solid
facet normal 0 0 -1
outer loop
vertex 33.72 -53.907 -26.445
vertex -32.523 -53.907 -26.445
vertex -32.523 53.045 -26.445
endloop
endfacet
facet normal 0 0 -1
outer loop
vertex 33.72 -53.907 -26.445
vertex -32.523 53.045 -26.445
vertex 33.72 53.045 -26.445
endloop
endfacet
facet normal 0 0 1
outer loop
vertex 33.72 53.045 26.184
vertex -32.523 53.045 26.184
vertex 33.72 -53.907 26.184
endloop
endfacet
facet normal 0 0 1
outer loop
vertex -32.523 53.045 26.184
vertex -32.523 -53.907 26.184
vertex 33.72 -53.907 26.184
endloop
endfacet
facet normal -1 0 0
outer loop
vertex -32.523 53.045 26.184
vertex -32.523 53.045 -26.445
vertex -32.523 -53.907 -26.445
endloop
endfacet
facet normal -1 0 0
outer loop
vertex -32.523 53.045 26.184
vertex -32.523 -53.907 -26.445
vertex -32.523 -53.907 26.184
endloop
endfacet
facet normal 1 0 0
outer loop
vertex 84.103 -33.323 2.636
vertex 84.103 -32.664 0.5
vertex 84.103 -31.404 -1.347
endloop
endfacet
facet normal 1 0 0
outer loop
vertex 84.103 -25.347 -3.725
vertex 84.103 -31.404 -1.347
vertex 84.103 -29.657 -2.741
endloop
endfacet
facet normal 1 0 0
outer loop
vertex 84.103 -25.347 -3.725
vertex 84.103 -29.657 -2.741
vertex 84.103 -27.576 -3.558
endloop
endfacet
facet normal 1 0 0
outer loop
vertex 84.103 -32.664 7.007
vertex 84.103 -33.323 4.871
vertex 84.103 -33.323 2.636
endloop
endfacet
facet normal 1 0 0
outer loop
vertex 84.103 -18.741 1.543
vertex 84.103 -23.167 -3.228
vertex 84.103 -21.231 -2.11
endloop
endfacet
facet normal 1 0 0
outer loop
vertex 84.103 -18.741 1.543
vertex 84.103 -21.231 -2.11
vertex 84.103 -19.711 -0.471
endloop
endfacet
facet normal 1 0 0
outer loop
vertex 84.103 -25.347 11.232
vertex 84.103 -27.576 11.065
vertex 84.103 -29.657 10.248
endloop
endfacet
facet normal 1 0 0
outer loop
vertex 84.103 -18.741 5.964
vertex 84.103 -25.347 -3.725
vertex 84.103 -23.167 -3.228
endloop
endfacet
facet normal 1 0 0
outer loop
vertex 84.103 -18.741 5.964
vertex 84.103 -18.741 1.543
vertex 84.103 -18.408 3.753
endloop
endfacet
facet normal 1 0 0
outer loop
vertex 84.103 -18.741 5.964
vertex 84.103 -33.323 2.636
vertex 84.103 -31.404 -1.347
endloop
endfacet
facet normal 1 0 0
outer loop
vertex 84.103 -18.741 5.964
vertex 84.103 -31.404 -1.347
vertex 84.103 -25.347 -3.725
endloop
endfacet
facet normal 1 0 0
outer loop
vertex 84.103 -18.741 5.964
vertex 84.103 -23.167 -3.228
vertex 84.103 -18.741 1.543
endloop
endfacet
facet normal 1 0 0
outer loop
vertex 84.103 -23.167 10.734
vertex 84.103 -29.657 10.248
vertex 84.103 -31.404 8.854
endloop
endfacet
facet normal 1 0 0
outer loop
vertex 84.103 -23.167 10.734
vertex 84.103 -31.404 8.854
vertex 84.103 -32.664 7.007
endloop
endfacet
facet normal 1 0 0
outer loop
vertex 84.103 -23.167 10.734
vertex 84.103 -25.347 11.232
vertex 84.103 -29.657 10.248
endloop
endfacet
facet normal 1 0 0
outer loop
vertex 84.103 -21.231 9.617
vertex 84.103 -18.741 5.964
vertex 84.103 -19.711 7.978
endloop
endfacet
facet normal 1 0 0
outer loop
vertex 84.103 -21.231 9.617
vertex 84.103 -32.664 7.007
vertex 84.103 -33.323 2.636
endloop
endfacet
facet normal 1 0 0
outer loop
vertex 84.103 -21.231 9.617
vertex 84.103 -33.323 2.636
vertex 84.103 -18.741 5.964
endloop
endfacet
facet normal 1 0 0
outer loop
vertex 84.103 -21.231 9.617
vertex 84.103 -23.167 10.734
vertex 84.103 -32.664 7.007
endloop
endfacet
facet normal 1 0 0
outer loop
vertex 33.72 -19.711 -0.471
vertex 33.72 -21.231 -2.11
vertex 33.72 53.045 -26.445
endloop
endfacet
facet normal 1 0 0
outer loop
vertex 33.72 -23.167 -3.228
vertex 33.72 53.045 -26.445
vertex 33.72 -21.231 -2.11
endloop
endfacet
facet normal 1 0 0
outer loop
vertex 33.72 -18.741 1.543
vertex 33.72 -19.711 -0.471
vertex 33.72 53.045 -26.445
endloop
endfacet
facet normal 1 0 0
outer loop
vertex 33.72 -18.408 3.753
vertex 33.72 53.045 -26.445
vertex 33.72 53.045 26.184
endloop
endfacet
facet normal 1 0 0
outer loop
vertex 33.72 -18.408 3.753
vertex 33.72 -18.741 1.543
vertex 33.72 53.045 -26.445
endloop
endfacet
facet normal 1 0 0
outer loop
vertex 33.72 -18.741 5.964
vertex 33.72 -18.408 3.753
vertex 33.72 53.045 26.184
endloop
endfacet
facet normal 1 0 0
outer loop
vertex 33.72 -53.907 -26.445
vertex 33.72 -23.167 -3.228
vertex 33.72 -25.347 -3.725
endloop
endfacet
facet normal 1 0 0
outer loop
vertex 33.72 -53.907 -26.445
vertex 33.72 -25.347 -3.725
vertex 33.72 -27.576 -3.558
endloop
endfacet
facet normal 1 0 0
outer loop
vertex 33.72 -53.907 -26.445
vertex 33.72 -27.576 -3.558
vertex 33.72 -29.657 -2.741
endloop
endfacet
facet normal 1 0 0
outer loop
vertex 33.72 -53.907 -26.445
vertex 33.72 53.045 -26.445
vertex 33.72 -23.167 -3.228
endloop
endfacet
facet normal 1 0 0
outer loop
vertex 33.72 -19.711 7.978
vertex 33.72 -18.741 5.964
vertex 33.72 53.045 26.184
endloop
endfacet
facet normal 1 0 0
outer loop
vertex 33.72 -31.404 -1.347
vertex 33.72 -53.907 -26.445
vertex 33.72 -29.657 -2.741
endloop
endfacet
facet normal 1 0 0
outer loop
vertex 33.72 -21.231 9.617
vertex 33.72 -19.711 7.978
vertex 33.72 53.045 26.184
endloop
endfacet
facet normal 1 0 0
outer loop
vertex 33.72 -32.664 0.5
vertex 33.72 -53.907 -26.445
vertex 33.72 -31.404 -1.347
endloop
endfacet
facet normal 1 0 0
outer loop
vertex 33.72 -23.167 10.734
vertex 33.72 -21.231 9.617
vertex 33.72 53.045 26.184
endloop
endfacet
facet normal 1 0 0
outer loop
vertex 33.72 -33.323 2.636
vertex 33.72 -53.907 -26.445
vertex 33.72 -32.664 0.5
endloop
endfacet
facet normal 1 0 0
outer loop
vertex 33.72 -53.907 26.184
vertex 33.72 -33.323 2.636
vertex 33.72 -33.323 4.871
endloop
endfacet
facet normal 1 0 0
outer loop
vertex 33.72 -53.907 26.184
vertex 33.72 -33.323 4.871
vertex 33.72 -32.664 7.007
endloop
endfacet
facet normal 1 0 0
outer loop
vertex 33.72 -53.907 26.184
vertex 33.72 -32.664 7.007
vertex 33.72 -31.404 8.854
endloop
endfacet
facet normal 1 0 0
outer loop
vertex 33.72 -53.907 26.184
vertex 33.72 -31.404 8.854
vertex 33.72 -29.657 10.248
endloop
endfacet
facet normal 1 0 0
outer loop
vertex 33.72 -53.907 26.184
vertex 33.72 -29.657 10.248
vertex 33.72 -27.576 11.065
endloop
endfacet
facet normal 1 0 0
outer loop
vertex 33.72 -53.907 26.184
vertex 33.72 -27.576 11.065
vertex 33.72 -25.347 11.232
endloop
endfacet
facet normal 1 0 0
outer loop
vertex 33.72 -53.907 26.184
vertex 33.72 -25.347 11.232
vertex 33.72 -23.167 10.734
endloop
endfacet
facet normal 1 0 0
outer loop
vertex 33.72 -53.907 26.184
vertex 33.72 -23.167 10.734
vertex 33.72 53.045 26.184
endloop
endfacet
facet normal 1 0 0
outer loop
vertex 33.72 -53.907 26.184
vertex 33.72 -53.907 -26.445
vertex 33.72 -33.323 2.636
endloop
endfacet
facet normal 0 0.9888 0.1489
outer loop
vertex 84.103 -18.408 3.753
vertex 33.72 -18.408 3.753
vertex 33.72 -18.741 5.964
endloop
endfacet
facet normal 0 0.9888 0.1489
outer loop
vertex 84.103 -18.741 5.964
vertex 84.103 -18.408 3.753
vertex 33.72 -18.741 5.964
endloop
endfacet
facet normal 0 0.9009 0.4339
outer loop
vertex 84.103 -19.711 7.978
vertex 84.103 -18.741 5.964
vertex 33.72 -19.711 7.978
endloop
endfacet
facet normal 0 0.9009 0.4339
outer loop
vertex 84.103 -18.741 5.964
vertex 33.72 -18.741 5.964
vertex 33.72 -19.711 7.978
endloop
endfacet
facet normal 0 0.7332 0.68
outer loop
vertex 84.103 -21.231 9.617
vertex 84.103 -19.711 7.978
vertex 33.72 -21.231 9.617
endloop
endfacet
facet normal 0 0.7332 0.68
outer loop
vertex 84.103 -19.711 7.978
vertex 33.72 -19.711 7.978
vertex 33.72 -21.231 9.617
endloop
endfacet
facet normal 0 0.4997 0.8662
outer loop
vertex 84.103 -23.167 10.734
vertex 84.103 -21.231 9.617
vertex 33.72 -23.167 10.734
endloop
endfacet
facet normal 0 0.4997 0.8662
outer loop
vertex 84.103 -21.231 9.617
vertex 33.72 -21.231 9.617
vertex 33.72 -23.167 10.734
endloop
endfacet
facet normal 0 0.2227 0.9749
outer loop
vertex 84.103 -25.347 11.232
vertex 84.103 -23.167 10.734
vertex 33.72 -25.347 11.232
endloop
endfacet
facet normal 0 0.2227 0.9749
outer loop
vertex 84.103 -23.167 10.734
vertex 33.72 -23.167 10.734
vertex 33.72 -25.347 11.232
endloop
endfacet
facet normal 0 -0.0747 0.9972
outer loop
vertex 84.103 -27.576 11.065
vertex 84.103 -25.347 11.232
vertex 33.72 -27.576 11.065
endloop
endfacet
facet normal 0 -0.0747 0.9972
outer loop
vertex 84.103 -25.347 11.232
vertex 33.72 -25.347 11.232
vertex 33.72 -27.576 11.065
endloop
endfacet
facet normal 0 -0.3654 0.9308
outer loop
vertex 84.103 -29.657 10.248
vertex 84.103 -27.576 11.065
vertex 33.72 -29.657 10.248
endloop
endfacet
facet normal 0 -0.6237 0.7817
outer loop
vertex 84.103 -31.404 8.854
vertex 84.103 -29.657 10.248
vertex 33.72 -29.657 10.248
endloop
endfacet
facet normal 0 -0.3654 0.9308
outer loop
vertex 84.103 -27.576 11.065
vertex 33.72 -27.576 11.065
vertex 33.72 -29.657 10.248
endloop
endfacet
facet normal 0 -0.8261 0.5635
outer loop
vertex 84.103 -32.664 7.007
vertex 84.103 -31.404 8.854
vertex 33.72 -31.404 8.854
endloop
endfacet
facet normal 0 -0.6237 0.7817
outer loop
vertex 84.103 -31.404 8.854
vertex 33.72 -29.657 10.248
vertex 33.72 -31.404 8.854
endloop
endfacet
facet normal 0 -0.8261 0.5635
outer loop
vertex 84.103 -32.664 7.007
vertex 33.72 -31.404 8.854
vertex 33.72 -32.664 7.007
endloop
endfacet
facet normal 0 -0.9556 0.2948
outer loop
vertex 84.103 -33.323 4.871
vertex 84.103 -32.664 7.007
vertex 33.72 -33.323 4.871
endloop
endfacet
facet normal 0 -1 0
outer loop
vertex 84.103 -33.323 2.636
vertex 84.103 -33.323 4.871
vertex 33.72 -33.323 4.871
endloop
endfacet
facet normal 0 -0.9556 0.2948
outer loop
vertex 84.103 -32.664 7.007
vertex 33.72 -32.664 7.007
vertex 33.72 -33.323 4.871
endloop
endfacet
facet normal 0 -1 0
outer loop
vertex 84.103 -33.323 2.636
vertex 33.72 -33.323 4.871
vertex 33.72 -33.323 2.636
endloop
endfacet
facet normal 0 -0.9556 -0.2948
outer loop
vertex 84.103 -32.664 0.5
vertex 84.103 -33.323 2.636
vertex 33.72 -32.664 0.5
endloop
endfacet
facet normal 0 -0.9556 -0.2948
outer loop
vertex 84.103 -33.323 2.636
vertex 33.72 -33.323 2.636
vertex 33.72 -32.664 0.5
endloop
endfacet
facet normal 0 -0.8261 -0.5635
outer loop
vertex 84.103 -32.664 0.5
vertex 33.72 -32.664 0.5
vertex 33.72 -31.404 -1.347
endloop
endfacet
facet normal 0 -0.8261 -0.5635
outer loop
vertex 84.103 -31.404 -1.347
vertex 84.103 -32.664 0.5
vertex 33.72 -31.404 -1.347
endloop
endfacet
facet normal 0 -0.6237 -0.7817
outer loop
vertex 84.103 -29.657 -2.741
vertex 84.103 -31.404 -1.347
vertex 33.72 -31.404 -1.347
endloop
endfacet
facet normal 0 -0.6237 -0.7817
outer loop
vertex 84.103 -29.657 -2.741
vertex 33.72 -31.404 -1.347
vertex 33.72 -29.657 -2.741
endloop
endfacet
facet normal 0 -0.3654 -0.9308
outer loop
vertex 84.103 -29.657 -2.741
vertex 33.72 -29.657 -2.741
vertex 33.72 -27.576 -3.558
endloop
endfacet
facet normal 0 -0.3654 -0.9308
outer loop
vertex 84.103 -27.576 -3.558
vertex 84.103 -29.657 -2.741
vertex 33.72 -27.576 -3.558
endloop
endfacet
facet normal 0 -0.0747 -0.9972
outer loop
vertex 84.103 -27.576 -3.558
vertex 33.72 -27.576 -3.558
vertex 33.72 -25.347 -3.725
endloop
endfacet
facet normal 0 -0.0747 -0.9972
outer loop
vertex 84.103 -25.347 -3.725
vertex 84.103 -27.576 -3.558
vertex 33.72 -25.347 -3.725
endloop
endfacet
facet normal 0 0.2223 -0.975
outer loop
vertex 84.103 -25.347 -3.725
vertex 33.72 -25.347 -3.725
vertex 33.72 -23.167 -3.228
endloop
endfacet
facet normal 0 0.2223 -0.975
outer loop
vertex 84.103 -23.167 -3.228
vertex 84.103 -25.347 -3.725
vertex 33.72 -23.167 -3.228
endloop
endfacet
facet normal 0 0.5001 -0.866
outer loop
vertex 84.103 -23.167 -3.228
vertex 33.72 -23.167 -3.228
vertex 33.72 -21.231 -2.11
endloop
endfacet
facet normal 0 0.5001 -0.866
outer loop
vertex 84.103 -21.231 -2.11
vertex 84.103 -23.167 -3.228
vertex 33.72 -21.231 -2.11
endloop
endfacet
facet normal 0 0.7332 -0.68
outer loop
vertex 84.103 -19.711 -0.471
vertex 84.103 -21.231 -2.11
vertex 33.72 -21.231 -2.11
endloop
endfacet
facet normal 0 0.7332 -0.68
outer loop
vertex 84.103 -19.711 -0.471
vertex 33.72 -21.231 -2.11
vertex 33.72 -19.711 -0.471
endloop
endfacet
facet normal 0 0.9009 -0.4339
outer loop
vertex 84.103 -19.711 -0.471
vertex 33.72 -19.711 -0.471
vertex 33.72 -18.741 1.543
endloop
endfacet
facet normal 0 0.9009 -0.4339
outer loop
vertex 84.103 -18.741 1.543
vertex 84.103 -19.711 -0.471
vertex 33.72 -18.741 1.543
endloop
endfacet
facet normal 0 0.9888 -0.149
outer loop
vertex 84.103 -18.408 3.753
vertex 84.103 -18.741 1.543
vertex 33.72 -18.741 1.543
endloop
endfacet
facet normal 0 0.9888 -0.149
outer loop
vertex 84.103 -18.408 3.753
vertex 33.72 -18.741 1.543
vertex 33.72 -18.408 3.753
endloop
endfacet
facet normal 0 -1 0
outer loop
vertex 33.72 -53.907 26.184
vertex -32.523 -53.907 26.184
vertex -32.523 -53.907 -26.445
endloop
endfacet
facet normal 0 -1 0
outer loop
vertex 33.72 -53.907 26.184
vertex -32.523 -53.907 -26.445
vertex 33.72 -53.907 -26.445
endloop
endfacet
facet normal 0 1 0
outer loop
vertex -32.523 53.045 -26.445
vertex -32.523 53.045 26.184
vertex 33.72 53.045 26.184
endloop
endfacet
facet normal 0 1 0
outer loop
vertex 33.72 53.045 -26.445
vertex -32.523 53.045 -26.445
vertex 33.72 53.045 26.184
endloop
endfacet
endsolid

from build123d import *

# Parameters (mm, degrees)
F0_W     = 66.2436261773
F0_H     = 52.6286661625
F1_DEPTH = 53.9066623896
F2_DEPTH = 53.045405075
F3_R     = 7.4993670996
F4_DEPTH = 84.1025914997


# Not quite as in the source:
# - a feature names something its author has since deleted; it is built from what else it names


with BuildPart() as f1:
    # F0 (on Front) → F1 (new body)
    with BuildSketch(Plane.XZ):
        with Locations((0.5984865129, -0.1306533813)):
            Rectangle(F0_W, F0_H)
    extrude(amount=F1_DEPTH)

    # F2 (add): a face of the model
    f2_faces = [f1.faces().sort_by_distance(p)[0] for p in [
        (0.5984865129, 0, -0.1306533813),
    ]]
    extrude(f2_faces, amount=F2_DEPTH)

    # F3 (on Right) → F4 (join)
    with BuildSketch(Plane.YZ):
        with Locations((-25.9069353342, 3.7534534931)):
            Circle(F3_R)
    extrude(amount=F4_DEPTH)


solid = f1.part
